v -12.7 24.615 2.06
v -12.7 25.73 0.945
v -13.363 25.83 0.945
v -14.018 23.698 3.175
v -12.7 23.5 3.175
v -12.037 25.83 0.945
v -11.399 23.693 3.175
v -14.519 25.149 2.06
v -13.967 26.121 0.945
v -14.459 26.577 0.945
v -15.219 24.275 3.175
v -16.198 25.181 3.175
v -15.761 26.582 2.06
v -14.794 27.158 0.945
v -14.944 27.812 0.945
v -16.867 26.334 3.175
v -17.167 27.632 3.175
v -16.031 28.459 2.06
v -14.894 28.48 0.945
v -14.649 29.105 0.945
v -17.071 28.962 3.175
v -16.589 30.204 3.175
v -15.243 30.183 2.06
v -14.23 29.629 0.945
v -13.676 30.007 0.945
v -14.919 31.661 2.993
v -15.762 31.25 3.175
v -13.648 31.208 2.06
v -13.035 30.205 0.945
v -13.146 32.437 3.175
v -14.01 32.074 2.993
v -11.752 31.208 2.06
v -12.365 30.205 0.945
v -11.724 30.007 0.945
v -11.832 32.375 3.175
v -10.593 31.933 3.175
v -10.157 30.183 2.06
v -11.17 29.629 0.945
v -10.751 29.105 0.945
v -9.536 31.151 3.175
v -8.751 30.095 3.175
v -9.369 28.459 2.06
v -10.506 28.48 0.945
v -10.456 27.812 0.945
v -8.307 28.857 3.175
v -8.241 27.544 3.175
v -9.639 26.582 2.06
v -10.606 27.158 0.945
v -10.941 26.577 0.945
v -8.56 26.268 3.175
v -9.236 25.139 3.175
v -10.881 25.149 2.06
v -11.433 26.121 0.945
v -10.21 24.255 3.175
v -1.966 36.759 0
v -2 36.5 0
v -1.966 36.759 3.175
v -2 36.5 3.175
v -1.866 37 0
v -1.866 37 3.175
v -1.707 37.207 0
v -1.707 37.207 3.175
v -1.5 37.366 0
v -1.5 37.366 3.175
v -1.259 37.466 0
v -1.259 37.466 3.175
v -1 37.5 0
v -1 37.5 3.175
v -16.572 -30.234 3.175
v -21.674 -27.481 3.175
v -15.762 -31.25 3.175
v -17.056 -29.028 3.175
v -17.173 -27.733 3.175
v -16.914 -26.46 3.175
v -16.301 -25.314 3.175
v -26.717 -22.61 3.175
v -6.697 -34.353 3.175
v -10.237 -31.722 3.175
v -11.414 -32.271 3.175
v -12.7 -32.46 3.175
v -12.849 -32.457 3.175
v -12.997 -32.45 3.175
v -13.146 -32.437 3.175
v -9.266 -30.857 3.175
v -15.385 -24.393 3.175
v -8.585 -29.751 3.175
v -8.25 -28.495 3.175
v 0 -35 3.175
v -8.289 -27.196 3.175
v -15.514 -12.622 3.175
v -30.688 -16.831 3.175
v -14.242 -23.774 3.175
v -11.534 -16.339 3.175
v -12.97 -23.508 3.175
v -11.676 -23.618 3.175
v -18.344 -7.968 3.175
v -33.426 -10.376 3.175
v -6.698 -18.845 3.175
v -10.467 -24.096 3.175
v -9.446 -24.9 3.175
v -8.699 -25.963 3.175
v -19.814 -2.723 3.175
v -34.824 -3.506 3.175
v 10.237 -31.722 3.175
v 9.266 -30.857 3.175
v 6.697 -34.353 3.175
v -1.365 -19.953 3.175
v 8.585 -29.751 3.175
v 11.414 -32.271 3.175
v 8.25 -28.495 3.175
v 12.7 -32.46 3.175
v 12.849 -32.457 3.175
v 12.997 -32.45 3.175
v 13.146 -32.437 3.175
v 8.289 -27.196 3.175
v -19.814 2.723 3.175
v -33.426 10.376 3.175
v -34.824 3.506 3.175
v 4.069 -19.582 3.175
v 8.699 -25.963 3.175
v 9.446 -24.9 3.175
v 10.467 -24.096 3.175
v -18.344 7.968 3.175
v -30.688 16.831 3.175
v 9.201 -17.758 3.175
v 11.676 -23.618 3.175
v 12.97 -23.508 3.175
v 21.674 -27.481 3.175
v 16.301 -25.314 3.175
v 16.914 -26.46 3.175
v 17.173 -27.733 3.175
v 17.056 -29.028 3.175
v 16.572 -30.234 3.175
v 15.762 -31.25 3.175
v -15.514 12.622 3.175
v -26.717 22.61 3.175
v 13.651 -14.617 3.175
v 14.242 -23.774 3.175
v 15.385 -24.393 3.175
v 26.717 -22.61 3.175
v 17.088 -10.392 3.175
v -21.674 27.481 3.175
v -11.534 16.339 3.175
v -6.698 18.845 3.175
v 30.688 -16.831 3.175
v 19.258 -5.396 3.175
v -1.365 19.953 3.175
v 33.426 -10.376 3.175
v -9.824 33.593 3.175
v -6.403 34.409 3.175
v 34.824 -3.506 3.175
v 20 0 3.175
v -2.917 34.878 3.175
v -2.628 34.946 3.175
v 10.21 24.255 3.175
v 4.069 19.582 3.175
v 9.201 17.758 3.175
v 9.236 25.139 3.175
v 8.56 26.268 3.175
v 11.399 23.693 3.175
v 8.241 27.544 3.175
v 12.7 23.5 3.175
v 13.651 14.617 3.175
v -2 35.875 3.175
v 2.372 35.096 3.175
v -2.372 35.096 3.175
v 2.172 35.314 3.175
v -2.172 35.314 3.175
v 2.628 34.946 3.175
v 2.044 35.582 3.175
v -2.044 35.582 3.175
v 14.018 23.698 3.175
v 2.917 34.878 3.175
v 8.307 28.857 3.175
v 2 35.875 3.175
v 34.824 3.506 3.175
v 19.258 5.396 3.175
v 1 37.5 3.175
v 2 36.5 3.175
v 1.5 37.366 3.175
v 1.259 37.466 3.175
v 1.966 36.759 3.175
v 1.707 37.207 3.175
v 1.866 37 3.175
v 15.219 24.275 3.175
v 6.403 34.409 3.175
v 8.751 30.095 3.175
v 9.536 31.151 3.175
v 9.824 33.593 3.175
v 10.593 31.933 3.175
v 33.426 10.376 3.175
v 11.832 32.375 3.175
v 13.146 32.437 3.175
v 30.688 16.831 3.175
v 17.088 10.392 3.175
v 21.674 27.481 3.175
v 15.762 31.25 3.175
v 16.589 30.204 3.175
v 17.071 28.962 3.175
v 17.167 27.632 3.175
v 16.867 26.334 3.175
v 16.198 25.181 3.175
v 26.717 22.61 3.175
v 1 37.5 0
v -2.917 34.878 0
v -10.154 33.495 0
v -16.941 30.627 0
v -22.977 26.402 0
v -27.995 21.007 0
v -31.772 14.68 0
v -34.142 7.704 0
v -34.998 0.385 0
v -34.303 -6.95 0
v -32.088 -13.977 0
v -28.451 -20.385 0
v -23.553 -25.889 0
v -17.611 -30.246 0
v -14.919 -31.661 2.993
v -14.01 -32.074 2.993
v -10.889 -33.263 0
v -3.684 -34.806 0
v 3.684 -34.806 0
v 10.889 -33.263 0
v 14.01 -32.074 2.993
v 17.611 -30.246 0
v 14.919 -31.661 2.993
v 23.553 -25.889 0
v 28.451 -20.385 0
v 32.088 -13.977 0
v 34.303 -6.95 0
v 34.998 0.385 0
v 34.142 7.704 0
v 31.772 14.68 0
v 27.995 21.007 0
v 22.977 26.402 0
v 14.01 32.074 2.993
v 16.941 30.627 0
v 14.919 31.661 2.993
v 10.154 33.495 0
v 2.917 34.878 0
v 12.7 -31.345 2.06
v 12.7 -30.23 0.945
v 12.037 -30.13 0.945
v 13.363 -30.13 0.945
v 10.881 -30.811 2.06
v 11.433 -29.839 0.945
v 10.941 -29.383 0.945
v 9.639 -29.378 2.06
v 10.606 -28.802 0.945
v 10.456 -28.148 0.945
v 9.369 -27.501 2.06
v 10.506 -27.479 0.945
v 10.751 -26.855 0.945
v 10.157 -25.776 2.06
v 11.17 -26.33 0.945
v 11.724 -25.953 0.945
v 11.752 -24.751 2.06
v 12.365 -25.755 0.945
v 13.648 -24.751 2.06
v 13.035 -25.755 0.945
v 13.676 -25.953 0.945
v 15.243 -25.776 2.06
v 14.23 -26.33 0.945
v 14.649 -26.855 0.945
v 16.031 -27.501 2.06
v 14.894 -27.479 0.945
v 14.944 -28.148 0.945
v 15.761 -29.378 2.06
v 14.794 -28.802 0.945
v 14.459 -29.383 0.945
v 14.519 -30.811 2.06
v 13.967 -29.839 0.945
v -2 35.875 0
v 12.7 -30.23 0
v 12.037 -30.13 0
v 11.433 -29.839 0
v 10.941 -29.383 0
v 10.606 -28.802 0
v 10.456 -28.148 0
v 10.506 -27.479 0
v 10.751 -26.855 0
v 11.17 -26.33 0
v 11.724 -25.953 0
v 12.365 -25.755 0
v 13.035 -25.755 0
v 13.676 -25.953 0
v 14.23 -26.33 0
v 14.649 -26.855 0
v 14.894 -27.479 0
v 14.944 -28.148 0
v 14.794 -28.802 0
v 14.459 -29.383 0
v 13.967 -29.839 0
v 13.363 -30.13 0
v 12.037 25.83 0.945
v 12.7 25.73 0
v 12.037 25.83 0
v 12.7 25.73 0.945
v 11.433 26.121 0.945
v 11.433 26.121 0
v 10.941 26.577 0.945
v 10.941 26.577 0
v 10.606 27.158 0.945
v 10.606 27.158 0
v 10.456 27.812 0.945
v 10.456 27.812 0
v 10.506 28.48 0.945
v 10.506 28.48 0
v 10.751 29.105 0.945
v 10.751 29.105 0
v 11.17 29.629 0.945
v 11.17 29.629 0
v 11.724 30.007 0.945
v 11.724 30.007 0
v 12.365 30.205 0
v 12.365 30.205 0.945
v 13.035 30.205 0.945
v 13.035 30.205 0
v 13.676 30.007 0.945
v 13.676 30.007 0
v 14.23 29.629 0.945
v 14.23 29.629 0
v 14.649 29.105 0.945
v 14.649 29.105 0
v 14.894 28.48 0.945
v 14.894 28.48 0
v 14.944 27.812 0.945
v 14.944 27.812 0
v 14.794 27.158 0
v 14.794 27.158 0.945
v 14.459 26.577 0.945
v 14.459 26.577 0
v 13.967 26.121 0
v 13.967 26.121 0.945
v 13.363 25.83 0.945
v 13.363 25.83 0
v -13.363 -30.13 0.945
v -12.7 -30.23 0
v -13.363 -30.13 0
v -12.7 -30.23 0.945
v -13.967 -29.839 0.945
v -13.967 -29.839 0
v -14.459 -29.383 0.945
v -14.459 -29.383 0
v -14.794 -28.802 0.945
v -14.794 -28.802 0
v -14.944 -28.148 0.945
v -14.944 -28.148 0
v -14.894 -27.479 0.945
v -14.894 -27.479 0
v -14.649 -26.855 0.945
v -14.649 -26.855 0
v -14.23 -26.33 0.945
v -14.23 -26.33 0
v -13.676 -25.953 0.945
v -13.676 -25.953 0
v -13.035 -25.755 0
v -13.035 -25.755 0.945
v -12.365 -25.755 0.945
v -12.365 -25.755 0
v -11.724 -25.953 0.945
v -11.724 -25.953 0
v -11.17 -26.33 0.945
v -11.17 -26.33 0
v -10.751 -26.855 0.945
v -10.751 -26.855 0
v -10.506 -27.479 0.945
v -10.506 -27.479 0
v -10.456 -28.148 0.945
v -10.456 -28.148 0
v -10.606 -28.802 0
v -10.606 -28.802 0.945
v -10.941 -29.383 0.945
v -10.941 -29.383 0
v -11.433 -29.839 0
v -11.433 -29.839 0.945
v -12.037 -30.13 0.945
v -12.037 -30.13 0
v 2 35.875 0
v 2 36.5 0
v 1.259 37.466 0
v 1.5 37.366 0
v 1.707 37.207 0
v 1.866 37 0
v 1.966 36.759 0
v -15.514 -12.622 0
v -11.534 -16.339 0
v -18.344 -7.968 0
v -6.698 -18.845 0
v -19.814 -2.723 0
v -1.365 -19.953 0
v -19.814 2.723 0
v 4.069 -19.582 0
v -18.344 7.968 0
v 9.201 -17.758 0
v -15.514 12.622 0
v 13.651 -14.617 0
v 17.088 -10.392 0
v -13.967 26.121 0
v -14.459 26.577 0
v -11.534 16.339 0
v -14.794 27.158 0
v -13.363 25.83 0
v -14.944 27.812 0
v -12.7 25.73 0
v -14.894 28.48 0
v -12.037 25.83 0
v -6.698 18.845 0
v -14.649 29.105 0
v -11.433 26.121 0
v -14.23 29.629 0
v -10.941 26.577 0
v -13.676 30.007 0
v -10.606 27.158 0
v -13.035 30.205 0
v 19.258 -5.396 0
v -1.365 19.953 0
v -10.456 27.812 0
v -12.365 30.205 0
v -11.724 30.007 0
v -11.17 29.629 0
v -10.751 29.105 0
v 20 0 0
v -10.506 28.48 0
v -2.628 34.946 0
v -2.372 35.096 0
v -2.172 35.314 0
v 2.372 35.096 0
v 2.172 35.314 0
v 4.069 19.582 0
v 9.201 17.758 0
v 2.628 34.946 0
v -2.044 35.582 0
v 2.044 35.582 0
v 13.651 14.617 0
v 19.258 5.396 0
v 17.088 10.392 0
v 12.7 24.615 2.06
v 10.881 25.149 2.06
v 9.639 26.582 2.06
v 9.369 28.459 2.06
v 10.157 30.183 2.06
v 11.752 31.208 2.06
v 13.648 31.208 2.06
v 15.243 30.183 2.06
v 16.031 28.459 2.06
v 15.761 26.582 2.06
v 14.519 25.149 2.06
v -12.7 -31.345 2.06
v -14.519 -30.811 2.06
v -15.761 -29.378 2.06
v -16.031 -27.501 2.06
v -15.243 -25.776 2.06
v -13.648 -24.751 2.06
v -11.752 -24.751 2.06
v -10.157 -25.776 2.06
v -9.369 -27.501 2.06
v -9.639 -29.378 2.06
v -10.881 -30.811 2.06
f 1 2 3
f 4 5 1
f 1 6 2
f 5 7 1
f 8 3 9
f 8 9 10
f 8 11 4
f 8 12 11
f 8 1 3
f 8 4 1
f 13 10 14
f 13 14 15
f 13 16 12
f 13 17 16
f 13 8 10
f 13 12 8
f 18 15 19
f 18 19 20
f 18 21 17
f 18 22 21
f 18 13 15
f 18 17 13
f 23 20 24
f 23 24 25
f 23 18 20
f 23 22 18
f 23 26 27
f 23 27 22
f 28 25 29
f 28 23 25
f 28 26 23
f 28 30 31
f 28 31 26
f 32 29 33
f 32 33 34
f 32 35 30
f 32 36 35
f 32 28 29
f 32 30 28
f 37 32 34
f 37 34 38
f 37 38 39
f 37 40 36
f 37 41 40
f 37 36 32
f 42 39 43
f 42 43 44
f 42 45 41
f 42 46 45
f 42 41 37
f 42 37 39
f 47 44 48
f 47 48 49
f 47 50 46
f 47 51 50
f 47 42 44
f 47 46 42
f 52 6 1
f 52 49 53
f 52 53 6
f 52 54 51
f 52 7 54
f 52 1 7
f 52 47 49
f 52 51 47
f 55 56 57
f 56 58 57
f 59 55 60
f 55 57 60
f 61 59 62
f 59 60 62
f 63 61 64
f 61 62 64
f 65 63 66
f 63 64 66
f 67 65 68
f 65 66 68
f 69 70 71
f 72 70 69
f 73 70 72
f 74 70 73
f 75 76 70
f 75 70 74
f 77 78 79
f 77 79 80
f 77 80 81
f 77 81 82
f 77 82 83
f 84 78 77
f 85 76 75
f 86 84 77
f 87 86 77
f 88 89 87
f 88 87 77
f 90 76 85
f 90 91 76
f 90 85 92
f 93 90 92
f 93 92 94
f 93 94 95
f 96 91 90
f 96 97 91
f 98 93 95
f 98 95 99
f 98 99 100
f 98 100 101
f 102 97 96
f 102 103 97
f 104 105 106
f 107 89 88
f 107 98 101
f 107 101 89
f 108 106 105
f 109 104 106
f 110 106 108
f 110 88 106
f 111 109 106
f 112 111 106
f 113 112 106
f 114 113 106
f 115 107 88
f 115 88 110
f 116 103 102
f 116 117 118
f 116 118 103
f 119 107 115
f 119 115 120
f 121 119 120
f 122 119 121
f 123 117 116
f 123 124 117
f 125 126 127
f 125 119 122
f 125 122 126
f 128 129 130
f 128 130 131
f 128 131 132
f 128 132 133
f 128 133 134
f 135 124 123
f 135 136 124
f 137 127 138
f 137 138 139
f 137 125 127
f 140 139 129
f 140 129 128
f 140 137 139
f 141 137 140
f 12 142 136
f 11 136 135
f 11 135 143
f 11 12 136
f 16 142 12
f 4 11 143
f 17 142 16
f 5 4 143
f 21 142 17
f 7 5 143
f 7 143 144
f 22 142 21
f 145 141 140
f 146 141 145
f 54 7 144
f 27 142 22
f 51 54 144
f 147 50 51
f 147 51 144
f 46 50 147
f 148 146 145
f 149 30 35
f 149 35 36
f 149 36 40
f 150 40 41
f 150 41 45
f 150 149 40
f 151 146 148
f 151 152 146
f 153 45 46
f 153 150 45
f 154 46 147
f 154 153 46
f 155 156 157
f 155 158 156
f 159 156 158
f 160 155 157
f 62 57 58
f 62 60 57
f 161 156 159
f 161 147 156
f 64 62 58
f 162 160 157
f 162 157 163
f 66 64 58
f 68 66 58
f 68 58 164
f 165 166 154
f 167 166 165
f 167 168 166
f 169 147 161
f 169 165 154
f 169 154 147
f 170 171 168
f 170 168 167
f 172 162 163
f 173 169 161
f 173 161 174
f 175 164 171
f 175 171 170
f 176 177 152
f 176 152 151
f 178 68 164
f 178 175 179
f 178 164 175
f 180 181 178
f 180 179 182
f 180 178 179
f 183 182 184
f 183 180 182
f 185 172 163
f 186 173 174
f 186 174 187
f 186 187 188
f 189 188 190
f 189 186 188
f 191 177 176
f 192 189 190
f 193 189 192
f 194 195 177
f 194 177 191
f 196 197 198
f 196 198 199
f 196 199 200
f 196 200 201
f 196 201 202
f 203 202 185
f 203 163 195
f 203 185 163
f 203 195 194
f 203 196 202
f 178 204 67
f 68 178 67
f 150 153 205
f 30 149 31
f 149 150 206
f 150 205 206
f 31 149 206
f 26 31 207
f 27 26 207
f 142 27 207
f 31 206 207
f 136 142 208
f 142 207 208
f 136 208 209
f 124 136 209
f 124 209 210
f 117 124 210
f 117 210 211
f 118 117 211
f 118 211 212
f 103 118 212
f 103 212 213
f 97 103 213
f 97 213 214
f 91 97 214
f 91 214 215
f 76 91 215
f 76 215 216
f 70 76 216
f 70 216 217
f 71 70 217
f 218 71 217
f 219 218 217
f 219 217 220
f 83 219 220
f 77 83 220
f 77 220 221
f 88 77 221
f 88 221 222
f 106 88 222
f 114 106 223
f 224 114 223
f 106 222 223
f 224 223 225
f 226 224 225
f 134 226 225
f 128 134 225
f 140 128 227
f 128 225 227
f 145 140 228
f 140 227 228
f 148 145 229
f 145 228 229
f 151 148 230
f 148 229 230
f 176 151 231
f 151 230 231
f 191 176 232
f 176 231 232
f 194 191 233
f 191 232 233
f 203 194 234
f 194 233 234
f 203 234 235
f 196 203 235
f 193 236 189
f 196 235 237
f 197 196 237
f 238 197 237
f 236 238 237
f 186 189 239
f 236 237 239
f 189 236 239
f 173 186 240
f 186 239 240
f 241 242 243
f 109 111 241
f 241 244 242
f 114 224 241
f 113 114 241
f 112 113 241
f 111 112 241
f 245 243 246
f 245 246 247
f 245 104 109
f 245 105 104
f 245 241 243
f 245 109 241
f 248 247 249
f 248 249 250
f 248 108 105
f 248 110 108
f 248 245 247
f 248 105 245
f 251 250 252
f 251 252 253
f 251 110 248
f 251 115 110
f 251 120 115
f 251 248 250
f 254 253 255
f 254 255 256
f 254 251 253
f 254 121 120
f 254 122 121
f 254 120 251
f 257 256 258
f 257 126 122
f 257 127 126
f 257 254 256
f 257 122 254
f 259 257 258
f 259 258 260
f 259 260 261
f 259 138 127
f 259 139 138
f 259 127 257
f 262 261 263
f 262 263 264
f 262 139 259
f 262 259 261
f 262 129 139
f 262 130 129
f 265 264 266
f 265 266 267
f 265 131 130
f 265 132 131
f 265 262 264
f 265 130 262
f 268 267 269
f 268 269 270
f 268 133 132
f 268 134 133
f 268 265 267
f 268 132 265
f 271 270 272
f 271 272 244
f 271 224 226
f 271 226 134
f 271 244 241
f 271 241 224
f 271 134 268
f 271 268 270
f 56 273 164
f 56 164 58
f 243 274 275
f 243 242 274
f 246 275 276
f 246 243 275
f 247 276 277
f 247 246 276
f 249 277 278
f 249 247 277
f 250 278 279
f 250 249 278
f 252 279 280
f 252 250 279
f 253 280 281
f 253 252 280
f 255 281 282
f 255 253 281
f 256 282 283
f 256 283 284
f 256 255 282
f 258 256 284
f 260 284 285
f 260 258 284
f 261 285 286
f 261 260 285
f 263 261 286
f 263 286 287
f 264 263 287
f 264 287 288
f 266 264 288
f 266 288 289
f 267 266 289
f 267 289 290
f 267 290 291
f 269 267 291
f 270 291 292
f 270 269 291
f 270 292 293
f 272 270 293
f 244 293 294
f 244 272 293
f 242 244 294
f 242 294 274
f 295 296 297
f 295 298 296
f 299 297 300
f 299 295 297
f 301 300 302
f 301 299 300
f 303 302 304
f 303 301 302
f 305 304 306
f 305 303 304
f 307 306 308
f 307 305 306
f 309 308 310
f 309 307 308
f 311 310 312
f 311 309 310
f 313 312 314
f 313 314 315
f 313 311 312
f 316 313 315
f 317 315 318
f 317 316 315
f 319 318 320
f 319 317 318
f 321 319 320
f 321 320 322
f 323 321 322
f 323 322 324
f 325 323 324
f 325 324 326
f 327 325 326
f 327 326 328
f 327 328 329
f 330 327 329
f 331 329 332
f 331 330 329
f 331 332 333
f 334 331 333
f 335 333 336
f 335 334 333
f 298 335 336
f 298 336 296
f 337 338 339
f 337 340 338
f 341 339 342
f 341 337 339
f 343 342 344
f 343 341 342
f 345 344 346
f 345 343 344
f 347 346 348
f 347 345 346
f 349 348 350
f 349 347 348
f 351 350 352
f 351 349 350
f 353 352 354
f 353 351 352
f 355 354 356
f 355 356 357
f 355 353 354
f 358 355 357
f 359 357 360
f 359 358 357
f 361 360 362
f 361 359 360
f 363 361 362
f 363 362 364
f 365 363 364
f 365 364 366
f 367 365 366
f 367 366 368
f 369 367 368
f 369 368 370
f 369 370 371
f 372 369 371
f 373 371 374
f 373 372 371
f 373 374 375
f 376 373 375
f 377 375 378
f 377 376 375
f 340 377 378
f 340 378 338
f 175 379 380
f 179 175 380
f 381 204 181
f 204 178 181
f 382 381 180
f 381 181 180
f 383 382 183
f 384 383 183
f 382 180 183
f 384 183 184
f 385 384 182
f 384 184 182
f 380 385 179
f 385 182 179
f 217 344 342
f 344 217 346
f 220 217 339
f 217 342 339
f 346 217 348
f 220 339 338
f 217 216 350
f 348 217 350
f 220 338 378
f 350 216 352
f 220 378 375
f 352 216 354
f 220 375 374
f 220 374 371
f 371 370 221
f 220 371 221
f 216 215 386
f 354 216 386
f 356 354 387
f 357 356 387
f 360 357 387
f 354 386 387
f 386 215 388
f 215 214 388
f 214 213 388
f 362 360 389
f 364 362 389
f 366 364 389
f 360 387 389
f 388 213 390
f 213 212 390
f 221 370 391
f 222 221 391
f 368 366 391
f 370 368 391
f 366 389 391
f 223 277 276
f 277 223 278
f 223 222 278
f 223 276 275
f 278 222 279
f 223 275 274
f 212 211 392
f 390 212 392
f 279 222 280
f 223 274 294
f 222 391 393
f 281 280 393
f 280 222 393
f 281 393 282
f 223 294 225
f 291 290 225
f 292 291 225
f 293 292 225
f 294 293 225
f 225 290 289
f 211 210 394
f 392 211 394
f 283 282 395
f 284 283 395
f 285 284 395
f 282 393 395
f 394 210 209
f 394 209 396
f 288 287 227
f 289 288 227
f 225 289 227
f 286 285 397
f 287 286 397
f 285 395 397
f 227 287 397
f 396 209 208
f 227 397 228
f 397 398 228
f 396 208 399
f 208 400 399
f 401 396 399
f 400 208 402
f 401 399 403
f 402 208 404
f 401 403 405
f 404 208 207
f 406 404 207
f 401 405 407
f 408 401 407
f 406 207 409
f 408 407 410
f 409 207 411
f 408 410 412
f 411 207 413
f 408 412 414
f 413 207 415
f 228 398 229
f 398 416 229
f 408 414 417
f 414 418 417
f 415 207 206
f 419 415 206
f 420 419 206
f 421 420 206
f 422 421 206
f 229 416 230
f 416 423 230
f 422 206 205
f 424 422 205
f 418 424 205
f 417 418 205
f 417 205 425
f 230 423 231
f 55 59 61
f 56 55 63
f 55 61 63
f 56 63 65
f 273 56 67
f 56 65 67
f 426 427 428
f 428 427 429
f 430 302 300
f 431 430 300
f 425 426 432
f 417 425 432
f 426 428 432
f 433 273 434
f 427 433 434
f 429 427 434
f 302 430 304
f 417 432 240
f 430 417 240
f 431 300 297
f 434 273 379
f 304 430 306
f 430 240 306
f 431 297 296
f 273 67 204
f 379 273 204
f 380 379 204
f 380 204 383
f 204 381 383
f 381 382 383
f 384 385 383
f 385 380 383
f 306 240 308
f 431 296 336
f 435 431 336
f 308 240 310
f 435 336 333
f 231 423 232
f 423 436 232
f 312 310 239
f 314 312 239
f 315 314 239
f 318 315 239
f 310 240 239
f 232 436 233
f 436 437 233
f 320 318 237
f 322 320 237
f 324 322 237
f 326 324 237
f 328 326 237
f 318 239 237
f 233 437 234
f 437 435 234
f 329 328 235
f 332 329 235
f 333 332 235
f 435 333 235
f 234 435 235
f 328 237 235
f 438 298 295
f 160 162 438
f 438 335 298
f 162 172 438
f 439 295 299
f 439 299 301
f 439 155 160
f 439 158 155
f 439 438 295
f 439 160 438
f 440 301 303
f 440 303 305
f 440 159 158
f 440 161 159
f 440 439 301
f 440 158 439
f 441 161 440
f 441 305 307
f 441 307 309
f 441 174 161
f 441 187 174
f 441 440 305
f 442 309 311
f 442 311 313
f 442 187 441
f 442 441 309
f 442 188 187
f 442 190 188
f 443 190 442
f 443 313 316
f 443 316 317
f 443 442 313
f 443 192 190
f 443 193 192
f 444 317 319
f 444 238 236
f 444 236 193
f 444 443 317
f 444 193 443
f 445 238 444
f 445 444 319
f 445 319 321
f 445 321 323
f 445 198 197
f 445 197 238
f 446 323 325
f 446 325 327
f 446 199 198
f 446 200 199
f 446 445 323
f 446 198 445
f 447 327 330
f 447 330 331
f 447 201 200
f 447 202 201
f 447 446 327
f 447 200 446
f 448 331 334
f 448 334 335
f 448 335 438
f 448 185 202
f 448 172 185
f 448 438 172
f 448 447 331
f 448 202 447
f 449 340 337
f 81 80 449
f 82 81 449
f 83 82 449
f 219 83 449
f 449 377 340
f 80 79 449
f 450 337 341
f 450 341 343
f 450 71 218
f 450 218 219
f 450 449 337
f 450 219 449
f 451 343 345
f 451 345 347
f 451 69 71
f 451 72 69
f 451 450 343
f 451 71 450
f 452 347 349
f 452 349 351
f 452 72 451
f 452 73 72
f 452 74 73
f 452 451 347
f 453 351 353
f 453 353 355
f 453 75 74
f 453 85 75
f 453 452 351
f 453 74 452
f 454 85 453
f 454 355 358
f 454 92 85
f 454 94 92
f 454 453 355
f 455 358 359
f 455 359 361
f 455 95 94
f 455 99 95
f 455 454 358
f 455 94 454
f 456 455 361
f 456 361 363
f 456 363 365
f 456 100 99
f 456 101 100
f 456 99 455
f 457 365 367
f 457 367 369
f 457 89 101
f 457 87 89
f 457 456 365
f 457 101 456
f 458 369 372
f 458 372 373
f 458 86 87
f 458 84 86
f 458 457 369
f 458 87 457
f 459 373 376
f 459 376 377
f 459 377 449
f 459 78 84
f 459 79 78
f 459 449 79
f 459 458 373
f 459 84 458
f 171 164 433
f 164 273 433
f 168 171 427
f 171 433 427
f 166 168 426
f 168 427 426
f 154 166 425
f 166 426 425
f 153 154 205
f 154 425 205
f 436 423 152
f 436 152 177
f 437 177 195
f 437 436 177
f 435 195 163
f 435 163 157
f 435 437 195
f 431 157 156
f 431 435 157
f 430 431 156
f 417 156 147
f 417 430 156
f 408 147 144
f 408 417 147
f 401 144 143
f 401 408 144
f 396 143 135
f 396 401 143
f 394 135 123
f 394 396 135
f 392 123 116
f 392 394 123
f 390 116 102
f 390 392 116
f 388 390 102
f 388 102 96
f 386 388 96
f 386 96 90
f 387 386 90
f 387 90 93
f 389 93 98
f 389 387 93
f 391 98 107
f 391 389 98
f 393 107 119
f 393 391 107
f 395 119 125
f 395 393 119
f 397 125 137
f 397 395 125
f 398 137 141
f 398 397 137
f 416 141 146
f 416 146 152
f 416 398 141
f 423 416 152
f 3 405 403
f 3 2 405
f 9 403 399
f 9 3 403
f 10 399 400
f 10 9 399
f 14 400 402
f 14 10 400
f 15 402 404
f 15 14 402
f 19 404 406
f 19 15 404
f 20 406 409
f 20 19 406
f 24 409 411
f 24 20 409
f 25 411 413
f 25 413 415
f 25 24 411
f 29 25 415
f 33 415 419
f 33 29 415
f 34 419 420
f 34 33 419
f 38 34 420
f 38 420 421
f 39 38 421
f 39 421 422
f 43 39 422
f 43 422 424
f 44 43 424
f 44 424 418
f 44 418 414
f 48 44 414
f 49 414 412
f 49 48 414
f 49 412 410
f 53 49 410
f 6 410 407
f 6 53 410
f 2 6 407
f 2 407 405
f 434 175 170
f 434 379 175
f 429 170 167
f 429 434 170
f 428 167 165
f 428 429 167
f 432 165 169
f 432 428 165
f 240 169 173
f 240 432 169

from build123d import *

# Parameters (mm, degrees)
SKETCH2_R                    = 35
SKETCH2_R_2                  = 20
BOSS_EXTRUDE1_DEPTH          = 3.175
CSK_FOR_M4_SFHCS1_AT_2_COUNT = 2
CSK_FOR_M4_SFHCS1_AT_2_PITCH = 25.4
CSK_FOR_M4_SFHCS1_AT_3_COUNT = 2
CSK_FOR_M4_SFHCS1_AT_3_PITCH = 61.454142663
CSK_FOR_M4_SFHCS1_AT_4_COUNT = 2
CSK_FOR_M4_SFHCS1_AT_4_PITCH = 55.959375
SKETCH5_W                    = 4
SKETCH5_H                    = 5
BOSS_EXTRUDE2_DEPTH          = 3.175
FILLET1_R                    = 1


with BuildPart() as part:
    # Sketch2 → Boss-Extrude1 (new body)
    with BuildSketch(Plane.XY):
        Circle(SKETCH2_R)
        Circle(SKETCH2_R_2, mode=Mode.SUBTRACT)
    extrude(amount=BOSS_EXTRUDE1_DEPTH)

    # Sketch4 → CSK for M4 SFHCS1 (revolve, cut)
    with BuildSketch(Plane(origin=(-12.7, 27.9796875, 3.175), x_dir=(0, -1, 0), z_dir=(1, 0, 0))):
        Polygon((0, 0), (0, 3.175), (2.25, 3.175), (2.25, 2.23), (4.48, 0), align=None)
    csk_for_m4_sfhcs1 = revolve(axis=Axis((-12.7, 27.9796875, 9.525), (0, 0, -1)), mode=Mode.SUBTRACT)

    # CSK for M4 SFHCS1 at 2: CSK for M4 SFHCS1 ×2
    with Locations(*[(i * CSK_FOR_M4_SFHCS1_AT_2_PITCH, 0, 0) for i in range(1, CSK_FOR_M4_SFHCS1_AT_2_COUNT)]):
        add(csk_for_m4_sfhcs1, mode=Mode.SUBTRACT)

    # CSK for M4 SFHCS1 at 3: CSK for M4 SFHCS1 ×2
    with Locations(*[Vector(0.413316318, -0.910587514, 0) * (i * CSK_FOR_M4_SFHCS1_AT_3_PITCH) for i in range(1, CSK_FOR_M4_SFHCS1_AT_3_COUNT)]):
        add(csk_for_m4_sfhcs1, mode=Mode.SUBTRACT)

    # CSK for M4 SFHCS1 at 4: CSK for M4 SFHCS1 ×2
    with Locations(*[(0, -i * CSK_FOR_M4_SFHCS1_AT_4_PITCH, 0) for i in range(1, CSK_FOR_M4_SFHCS1_AT_4_COUNT)]):
        add(csk_for_m4_sfhcs1, mode=Mode.SUBTRACT)

    # Sketch5 → Boss-Extrude2 (add)
    with BuildSketch(Plane(origin=(0, 0, 0), x_dir=(-1, 0, 0), z_dir=(0, 0, -1))):
        with Locations((0, 35)):
            Rectangle(SKETCH5_W, SKETCH5_H)
    extrude(amount=-BOSS_EXTRUDE2_DEPTH)

    # Fillet1
    fillet1_edges = [part.edges().sort_by_distance(p)[0] for p in [
        (-2, 37.5, 1.5875),
        (-2, 34.942810419, 1.5875),
        (2, 37.5, 1.5875),
        (2, 34.942810419, 1.5875),
    ]]
    fillet(fillet1_edges, radius=FILLET1_R)


solid = part.part
